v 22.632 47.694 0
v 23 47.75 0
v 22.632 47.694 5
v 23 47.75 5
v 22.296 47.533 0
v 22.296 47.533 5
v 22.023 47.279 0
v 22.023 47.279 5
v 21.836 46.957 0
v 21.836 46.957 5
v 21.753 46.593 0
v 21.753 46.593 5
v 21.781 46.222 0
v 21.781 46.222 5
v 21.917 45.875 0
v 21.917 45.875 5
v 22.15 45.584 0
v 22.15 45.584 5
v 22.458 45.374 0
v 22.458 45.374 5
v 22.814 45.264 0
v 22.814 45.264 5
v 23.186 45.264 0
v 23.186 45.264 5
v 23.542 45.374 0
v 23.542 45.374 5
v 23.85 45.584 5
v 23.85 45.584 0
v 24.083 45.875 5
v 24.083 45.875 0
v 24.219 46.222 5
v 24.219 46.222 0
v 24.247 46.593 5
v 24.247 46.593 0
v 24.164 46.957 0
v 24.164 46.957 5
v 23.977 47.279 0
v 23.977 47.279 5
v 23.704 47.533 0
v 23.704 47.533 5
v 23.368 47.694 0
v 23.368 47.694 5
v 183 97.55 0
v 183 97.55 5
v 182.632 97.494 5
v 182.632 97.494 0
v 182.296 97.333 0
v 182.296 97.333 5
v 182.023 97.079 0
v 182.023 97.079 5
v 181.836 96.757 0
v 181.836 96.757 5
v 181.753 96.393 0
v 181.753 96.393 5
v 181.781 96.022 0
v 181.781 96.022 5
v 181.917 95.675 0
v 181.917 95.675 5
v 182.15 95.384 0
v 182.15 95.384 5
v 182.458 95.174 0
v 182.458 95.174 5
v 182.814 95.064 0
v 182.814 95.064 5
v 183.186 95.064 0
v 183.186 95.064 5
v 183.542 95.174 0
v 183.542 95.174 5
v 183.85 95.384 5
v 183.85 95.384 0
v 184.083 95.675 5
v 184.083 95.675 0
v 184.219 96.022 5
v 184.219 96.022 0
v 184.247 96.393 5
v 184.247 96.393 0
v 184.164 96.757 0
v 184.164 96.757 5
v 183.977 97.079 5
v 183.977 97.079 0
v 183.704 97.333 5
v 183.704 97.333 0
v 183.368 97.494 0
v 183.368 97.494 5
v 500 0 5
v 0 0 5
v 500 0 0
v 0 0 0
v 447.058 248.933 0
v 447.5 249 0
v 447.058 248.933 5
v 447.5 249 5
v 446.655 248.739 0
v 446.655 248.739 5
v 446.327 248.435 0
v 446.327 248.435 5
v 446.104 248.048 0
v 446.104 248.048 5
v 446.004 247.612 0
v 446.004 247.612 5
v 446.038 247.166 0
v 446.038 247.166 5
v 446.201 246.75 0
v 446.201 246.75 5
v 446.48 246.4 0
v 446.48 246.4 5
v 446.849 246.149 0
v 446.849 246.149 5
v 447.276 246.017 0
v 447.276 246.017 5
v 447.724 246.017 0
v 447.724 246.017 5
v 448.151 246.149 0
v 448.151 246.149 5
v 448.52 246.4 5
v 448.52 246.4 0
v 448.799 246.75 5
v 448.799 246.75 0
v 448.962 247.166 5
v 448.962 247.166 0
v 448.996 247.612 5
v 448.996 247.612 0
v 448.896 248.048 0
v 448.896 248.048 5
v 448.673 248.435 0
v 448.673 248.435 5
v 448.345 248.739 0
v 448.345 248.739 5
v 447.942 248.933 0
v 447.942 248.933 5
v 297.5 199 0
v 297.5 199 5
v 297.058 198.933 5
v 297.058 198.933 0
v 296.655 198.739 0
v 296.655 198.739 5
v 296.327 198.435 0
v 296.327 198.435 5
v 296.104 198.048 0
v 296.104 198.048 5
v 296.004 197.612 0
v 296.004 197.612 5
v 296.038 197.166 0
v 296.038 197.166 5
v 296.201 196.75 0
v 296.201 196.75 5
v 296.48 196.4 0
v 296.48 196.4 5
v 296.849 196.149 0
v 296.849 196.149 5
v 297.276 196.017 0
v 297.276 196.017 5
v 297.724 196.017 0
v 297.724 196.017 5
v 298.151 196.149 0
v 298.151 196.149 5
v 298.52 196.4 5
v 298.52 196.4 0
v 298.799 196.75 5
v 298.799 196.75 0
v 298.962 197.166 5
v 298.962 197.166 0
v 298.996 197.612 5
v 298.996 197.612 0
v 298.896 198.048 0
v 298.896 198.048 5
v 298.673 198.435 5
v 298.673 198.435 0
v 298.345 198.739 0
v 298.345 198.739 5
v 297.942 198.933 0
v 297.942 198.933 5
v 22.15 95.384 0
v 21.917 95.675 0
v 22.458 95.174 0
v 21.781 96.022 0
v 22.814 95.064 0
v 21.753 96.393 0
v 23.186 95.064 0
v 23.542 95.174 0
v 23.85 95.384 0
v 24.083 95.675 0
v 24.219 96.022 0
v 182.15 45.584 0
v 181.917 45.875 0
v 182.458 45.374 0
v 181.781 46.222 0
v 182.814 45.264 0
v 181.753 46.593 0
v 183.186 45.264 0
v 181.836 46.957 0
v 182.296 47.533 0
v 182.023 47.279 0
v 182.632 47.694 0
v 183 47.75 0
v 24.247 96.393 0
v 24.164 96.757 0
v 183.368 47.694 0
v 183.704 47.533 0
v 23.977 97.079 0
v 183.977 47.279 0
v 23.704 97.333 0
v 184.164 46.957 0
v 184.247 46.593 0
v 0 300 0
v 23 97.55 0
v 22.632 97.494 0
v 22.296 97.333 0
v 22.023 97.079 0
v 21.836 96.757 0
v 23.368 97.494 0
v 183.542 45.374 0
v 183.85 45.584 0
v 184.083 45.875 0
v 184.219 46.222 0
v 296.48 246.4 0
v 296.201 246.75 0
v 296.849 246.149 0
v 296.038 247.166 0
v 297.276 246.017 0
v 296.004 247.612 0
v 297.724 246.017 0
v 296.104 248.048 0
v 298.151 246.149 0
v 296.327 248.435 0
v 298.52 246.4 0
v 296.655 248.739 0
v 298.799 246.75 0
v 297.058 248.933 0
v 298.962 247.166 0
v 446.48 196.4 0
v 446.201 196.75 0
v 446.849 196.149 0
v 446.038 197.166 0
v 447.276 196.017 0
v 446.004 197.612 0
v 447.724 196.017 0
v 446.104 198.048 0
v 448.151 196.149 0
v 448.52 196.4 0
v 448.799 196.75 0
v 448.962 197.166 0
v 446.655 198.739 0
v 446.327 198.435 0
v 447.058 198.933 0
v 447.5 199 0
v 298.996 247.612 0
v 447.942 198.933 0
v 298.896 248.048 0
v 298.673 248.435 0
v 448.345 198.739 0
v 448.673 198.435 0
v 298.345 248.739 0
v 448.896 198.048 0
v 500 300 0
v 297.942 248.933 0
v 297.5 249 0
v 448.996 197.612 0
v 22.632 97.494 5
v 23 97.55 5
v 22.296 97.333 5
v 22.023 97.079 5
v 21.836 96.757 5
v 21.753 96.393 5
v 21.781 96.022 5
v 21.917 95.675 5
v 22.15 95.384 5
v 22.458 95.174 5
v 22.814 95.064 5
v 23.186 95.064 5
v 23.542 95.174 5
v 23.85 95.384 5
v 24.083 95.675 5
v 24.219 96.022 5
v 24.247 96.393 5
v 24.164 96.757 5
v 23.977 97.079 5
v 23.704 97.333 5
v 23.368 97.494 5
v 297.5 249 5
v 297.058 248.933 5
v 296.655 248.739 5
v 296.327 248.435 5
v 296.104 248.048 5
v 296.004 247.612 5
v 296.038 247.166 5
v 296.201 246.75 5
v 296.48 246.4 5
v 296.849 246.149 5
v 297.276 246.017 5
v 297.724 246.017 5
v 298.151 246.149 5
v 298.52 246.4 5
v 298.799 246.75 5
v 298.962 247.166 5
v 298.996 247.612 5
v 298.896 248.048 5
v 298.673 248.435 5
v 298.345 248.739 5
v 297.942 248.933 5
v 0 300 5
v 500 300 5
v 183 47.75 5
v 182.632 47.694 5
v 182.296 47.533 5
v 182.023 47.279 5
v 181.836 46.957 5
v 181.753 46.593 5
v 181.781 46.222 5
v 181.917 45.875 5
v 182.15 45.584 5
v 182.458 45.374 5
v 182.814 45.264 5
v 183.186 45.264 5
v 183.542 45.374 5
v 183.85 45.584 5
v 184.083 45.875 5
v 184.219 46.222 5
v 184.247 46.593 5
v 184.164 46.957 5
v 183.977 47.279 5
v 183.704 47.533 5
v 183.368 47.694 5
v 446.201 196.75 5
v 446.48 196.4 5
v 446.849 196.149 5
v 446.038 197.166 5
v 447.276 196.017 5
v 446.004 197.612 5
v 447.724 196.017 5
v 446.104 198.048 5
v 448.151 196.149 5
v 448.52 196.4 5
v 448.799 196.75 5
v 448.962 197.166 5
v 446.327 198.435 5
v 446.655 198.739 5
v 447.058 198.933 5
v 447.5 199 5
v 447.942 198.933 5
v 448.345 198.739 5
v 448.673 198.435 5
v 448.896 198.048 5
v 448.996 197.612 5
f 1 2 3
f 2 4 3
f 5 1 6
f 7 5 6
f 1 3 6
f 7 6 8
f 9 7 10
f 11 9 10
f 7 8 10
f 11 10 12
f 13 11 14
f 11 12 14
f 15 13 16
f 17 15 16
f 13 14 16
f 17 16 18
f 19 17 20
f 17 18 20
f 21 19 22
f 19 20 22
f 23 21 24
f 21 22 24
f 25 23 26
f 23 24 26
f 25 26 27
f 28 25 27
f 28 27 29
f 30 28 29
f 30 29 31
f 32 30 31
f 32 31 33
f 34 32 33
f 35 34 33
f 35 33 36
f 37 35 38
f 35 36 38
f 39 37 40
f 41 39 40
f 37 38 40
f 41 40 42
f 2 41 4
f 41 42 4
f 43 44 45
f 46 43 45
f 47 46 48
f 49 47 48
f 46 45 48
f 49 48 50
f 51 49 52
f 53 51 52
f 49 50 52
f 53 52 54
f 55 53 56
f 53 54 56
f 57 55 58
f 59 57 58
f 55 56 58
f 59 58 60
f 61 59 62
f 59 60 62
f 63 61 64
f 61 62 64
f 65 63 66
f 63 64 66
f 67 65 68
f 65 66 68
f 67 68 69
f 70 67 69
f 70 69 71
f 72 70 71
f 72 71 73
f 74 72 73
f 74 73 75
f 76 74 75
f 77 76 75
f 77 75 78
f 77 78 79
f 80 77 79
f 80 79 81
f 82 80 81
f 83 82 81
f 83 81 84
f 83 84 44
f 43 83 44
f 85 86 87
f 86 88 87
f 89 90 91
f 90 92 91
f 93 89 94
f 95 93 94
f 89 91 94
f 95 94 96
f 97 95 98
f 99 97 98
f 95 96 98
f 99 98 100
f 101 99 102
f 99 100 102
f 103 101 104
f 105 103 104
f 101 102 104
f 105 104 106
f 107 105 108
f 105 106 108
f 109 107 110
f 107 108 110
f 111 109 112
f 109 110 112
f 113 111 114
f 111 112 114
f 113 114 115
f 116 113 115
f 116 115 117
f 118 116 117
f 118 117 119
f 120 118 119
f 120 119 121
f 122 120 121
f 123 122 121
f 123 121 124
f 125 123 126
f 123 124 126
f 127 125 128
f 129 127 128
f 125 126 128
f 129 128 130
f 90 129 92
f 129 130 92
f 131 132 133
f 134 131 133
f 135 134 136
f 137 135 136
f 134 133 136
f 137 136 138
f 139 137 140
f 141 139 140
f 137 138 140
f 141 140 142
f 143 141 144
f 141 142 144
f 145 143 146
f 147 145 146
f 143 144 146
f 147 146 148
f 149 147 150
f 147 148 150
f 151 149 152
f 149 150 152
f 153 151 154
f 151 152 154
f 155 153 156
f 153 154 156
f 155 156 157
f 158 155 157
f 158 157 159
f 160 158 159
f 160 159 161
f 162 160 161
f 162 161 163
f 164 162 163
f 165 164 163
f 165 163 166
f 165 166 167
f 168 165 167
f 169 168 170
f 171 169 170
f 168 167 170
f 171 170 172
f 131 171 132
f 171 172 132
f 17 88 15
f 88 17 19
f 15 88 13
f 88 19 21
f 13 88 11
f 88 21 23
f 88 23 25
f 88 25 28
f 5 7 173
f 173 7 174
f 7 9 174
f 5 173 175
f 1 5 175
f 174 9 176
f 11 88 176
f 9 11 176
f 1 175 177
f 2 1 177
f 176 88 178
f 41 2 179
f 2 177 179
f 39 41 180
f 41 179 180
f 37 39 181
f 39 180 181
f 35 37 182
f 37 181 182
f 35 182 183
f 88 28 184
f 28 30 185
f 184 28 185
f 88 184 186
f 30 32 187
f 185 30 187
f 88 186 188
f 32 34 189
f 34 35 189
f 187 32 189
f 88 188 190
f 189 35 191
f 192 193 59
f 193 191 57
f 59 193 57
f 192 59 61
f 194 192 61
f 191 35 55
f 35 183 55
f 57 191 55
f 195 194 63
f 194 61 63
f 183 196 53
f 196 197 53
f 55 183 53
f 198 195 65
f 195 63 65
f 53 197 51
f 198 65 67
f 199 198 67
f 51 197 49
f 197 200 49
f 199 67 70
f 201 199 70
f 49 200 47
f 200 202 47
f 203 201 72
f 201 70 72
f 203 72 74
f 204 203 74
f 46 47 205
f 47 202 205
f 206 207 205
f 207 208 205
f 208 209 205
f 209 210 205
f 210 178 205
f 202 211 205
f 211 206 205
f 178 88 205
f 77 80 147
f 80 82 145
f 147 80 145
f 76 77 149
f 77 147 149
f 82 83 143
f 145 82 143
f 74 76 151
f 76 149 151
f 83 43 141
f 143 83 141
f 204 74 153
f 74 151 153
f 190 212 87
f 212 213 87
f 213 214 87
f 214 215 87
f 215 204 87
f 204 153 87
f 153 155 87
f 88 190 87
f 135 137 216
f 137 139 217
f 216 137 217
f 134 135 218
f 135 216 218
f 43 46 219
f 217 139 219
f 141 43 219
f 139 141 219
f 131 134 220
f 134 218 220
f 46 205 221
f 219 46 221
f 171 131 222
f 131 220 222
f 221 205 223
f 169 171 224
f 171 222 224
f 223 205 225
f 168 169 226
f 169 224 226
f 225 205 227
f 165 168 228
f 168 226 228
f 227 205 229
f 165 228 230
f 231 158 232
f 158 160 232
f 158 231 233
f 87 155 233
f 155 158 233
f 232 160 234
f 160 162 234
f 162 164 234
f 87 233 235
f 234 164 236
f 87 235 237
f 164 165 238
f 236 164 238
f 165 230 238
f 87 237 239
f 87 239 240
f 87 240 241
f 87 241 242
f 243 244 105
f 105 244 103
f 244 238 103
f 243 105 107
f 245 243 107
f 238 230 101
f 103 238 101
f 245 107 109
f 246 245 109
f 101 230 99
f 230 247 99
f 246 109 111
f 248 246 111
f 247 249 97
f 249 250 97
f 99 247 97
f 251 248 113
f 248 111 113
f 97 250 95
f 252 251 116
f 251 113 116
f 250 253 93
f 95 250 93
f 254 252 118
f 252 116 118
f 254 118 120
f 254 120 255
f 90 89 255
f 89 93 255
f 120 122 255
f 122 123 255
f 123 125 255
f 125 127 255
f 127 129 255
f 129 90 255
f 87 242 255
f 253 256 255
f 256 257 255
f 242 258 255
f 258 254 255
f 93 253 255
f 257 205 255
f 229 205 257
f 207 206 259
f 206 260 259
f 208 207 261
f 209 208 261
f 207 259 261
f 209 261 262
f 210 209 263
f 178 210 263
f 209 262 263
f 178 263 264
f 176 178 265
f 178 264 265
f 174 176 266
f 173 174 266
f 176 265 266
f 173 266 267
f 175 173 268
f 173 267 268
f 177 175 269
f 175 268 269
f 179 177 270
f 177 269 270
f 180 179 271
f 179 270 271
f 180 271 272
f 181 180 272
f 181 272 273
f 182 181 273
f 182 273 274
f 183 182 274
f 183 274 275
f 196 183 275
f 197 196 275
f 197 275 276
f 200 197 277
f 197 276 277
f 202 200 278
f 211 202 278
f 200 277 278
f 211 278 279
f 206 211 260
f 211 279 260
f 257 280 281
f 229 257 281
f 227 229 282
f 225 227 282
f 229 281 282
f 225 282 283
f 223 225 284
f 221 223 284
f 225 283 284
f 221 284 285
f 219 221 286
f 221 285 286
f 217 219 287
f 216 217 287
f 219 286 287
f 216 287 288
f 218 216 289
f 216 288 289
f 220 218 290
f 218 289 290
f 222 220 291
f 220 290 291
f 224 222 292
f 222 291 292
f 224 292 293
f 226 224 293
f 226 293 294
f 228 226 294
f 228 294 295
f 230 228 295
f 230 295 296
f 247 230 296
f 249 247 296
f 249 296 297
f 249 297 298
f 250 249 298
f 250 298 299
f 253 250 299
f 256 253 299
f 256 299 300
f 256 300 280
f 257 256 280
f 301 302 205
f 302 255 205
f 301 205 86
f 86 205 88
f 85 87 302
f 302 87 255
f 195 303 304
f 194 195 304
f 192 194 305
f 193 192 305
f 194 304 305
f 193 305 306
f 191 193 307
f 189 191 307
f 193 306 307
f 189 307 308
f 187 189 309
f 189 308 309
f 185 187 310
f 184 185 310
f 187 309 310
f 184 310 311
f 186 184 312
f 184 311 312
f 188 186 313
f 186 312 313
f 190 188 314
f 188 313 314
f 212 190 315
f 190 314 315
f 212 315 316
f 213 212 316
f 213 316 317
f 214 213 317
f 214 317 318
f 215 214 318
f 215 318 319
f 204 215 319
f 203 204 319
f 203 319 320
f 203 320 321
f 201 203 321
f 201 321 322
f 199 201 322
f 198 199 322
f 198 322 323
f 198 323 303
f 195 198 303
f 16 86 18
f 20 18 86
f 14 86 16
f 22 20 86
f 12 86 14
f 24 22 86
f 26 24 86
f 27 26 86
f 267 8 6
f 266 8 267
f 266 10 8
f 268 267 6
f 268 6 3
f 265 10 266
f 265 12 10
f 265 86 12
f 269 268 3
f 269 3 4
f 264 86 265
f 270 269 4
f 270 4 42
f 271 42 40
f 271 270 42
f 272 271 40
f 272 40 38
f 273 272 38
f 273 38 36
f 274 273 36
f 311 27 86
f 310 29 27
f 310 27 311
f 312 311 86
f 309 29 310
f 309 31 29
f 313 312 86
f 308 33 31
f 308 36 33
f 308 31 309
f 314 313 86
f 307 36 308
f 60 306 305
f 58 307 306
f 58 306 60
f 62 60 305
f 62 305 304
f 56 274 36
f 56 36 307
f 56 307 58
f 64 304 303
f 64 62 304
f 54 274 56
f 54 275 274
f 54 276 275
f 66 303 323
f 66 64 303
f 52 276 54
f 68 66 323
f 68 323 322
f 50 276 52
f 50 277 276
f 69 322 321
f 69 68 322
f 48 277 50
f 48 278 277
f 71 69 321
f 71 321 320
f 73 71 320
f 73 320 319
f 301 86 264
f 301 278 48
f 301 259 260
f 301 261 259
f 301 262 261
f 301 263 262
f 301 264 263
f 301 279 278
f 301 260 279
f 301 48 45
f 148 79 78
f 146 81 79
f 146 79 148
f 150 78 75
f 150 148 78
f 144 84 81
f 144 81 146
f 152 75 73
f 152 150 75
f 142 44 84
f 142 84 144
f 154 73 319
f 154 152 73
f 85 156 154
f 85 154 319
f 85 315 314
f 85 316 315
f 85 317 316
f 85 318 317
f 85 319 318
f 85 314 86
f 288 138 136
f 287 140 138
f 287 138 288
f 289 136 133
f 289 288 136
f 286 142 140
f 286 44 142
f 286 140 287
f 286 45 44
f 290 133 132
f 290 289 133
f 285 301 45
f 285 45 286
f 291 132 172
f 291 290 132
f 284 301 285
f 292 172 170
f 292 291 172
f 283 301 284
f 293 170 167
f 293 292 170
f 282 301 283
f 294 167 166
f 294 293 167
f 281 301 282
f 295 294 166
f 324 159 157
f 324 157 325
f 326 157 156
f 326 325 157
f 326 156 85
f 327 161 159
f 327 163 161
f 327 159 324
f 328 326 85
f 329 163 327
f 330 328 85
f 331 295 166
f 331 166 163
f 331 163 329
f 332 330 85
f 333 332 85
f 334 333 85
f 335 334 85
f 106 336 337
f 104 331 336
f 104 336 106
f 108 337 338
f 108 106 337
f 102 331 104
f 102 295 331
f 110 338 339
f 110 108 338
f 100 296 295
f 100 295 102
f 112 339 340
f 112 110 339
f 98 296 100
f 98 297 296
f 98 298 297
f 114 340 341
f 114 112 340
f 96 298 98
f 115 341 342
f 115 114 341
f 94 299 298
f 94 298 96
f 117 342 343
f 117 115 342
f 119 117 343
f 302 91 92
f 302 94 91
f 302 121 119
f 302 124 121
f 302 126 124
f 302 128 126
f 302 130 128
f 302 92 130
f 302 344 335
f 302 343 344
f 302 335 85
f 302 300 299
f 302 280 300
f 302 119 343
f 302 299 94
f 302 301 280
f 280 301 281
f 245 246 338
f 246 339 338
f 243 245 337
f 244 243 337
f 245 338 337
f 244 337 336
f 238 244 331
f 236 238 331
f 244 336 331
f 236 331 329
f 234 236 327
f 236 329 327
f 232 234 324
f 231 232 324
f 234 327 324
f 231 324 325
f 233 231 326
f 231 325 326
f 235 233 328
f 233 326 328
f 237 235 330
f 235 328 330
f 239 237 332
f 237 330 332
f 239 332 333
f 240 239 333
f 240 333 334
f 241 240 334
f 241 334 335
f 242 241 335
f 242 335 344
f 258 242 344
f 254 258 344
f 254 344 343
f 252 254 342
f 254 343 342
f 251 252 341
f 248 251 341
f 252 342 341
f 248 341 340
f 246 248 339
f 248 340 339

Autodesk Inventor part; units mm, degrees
ref_plane "YZ Plane" through (0, 0, 0) normal (1, 0, 0) x (0, 1, 0)
ref_plane "XZ Plane" through (0, 0, 0) normal (0, 1, 0) x (-1, 0, 0)
ref_plane "XY Plane" through (0, 0, 0) normal (0, 0, 1) x (1, 0, 0)
sketch "Sketch1" plane through (0, 0, 0) normal (0, 0, 1) x (1, 0, 0)
  line L0 (0, 0) -> (500, 0)
  line L1 (500, 0) -> (500, 300)
  line L2 (500, 300) -> (0, 300)
  line L3 (0, 300) -> (0, 0)
  point P0 (23, 46.5)
  point P1 (23, 96.3)
  point P2 (183, 46.5)
  point P3 (183, 96.3)
  point P4 (447.5, 247.5)
  point P5 (297.5, 247.5)
  point P6 (297.5, 197.5)
  point P7 (447.5, 197.5)
  dimension "d0" = 500
  dimension "d1" = 300
  dimension "d2" = 46.5
  dimension "d3" = 23
  dimension "d4" = 49.8
  dimension "d5" = 160
  dimension "d6" = 160
  dimension "d7" = 49.8
  dimension "d8" = 52.5
  dimension "d9" = 52.5
  dimension "d11" = 150
  dimension "d12" = 52.5
  dimension "d13" = 150
  dimension "d14" = 50
  dimension "d15" = 50
  dimension "d16" = 52.5
extrude "Extrusion1" add sketch "Sketch1" along normal blind 5
hole "Hole1" at (297.5, 197.5, 0) at (297.5, 247.5, 0) at (447.5, 247.5, 0) at (447.5, 197.5, 0) direction (0, 0, 1) diameter 3 end through all
hole "Hole2" at (23, 46.5, 0) at (23, 96.3, 0) at (183, 46.5, 0) at (183, 96.3, 0) direction (0, 0, 1) diameter 2.5 end through all
properties part number "mounting plate"
